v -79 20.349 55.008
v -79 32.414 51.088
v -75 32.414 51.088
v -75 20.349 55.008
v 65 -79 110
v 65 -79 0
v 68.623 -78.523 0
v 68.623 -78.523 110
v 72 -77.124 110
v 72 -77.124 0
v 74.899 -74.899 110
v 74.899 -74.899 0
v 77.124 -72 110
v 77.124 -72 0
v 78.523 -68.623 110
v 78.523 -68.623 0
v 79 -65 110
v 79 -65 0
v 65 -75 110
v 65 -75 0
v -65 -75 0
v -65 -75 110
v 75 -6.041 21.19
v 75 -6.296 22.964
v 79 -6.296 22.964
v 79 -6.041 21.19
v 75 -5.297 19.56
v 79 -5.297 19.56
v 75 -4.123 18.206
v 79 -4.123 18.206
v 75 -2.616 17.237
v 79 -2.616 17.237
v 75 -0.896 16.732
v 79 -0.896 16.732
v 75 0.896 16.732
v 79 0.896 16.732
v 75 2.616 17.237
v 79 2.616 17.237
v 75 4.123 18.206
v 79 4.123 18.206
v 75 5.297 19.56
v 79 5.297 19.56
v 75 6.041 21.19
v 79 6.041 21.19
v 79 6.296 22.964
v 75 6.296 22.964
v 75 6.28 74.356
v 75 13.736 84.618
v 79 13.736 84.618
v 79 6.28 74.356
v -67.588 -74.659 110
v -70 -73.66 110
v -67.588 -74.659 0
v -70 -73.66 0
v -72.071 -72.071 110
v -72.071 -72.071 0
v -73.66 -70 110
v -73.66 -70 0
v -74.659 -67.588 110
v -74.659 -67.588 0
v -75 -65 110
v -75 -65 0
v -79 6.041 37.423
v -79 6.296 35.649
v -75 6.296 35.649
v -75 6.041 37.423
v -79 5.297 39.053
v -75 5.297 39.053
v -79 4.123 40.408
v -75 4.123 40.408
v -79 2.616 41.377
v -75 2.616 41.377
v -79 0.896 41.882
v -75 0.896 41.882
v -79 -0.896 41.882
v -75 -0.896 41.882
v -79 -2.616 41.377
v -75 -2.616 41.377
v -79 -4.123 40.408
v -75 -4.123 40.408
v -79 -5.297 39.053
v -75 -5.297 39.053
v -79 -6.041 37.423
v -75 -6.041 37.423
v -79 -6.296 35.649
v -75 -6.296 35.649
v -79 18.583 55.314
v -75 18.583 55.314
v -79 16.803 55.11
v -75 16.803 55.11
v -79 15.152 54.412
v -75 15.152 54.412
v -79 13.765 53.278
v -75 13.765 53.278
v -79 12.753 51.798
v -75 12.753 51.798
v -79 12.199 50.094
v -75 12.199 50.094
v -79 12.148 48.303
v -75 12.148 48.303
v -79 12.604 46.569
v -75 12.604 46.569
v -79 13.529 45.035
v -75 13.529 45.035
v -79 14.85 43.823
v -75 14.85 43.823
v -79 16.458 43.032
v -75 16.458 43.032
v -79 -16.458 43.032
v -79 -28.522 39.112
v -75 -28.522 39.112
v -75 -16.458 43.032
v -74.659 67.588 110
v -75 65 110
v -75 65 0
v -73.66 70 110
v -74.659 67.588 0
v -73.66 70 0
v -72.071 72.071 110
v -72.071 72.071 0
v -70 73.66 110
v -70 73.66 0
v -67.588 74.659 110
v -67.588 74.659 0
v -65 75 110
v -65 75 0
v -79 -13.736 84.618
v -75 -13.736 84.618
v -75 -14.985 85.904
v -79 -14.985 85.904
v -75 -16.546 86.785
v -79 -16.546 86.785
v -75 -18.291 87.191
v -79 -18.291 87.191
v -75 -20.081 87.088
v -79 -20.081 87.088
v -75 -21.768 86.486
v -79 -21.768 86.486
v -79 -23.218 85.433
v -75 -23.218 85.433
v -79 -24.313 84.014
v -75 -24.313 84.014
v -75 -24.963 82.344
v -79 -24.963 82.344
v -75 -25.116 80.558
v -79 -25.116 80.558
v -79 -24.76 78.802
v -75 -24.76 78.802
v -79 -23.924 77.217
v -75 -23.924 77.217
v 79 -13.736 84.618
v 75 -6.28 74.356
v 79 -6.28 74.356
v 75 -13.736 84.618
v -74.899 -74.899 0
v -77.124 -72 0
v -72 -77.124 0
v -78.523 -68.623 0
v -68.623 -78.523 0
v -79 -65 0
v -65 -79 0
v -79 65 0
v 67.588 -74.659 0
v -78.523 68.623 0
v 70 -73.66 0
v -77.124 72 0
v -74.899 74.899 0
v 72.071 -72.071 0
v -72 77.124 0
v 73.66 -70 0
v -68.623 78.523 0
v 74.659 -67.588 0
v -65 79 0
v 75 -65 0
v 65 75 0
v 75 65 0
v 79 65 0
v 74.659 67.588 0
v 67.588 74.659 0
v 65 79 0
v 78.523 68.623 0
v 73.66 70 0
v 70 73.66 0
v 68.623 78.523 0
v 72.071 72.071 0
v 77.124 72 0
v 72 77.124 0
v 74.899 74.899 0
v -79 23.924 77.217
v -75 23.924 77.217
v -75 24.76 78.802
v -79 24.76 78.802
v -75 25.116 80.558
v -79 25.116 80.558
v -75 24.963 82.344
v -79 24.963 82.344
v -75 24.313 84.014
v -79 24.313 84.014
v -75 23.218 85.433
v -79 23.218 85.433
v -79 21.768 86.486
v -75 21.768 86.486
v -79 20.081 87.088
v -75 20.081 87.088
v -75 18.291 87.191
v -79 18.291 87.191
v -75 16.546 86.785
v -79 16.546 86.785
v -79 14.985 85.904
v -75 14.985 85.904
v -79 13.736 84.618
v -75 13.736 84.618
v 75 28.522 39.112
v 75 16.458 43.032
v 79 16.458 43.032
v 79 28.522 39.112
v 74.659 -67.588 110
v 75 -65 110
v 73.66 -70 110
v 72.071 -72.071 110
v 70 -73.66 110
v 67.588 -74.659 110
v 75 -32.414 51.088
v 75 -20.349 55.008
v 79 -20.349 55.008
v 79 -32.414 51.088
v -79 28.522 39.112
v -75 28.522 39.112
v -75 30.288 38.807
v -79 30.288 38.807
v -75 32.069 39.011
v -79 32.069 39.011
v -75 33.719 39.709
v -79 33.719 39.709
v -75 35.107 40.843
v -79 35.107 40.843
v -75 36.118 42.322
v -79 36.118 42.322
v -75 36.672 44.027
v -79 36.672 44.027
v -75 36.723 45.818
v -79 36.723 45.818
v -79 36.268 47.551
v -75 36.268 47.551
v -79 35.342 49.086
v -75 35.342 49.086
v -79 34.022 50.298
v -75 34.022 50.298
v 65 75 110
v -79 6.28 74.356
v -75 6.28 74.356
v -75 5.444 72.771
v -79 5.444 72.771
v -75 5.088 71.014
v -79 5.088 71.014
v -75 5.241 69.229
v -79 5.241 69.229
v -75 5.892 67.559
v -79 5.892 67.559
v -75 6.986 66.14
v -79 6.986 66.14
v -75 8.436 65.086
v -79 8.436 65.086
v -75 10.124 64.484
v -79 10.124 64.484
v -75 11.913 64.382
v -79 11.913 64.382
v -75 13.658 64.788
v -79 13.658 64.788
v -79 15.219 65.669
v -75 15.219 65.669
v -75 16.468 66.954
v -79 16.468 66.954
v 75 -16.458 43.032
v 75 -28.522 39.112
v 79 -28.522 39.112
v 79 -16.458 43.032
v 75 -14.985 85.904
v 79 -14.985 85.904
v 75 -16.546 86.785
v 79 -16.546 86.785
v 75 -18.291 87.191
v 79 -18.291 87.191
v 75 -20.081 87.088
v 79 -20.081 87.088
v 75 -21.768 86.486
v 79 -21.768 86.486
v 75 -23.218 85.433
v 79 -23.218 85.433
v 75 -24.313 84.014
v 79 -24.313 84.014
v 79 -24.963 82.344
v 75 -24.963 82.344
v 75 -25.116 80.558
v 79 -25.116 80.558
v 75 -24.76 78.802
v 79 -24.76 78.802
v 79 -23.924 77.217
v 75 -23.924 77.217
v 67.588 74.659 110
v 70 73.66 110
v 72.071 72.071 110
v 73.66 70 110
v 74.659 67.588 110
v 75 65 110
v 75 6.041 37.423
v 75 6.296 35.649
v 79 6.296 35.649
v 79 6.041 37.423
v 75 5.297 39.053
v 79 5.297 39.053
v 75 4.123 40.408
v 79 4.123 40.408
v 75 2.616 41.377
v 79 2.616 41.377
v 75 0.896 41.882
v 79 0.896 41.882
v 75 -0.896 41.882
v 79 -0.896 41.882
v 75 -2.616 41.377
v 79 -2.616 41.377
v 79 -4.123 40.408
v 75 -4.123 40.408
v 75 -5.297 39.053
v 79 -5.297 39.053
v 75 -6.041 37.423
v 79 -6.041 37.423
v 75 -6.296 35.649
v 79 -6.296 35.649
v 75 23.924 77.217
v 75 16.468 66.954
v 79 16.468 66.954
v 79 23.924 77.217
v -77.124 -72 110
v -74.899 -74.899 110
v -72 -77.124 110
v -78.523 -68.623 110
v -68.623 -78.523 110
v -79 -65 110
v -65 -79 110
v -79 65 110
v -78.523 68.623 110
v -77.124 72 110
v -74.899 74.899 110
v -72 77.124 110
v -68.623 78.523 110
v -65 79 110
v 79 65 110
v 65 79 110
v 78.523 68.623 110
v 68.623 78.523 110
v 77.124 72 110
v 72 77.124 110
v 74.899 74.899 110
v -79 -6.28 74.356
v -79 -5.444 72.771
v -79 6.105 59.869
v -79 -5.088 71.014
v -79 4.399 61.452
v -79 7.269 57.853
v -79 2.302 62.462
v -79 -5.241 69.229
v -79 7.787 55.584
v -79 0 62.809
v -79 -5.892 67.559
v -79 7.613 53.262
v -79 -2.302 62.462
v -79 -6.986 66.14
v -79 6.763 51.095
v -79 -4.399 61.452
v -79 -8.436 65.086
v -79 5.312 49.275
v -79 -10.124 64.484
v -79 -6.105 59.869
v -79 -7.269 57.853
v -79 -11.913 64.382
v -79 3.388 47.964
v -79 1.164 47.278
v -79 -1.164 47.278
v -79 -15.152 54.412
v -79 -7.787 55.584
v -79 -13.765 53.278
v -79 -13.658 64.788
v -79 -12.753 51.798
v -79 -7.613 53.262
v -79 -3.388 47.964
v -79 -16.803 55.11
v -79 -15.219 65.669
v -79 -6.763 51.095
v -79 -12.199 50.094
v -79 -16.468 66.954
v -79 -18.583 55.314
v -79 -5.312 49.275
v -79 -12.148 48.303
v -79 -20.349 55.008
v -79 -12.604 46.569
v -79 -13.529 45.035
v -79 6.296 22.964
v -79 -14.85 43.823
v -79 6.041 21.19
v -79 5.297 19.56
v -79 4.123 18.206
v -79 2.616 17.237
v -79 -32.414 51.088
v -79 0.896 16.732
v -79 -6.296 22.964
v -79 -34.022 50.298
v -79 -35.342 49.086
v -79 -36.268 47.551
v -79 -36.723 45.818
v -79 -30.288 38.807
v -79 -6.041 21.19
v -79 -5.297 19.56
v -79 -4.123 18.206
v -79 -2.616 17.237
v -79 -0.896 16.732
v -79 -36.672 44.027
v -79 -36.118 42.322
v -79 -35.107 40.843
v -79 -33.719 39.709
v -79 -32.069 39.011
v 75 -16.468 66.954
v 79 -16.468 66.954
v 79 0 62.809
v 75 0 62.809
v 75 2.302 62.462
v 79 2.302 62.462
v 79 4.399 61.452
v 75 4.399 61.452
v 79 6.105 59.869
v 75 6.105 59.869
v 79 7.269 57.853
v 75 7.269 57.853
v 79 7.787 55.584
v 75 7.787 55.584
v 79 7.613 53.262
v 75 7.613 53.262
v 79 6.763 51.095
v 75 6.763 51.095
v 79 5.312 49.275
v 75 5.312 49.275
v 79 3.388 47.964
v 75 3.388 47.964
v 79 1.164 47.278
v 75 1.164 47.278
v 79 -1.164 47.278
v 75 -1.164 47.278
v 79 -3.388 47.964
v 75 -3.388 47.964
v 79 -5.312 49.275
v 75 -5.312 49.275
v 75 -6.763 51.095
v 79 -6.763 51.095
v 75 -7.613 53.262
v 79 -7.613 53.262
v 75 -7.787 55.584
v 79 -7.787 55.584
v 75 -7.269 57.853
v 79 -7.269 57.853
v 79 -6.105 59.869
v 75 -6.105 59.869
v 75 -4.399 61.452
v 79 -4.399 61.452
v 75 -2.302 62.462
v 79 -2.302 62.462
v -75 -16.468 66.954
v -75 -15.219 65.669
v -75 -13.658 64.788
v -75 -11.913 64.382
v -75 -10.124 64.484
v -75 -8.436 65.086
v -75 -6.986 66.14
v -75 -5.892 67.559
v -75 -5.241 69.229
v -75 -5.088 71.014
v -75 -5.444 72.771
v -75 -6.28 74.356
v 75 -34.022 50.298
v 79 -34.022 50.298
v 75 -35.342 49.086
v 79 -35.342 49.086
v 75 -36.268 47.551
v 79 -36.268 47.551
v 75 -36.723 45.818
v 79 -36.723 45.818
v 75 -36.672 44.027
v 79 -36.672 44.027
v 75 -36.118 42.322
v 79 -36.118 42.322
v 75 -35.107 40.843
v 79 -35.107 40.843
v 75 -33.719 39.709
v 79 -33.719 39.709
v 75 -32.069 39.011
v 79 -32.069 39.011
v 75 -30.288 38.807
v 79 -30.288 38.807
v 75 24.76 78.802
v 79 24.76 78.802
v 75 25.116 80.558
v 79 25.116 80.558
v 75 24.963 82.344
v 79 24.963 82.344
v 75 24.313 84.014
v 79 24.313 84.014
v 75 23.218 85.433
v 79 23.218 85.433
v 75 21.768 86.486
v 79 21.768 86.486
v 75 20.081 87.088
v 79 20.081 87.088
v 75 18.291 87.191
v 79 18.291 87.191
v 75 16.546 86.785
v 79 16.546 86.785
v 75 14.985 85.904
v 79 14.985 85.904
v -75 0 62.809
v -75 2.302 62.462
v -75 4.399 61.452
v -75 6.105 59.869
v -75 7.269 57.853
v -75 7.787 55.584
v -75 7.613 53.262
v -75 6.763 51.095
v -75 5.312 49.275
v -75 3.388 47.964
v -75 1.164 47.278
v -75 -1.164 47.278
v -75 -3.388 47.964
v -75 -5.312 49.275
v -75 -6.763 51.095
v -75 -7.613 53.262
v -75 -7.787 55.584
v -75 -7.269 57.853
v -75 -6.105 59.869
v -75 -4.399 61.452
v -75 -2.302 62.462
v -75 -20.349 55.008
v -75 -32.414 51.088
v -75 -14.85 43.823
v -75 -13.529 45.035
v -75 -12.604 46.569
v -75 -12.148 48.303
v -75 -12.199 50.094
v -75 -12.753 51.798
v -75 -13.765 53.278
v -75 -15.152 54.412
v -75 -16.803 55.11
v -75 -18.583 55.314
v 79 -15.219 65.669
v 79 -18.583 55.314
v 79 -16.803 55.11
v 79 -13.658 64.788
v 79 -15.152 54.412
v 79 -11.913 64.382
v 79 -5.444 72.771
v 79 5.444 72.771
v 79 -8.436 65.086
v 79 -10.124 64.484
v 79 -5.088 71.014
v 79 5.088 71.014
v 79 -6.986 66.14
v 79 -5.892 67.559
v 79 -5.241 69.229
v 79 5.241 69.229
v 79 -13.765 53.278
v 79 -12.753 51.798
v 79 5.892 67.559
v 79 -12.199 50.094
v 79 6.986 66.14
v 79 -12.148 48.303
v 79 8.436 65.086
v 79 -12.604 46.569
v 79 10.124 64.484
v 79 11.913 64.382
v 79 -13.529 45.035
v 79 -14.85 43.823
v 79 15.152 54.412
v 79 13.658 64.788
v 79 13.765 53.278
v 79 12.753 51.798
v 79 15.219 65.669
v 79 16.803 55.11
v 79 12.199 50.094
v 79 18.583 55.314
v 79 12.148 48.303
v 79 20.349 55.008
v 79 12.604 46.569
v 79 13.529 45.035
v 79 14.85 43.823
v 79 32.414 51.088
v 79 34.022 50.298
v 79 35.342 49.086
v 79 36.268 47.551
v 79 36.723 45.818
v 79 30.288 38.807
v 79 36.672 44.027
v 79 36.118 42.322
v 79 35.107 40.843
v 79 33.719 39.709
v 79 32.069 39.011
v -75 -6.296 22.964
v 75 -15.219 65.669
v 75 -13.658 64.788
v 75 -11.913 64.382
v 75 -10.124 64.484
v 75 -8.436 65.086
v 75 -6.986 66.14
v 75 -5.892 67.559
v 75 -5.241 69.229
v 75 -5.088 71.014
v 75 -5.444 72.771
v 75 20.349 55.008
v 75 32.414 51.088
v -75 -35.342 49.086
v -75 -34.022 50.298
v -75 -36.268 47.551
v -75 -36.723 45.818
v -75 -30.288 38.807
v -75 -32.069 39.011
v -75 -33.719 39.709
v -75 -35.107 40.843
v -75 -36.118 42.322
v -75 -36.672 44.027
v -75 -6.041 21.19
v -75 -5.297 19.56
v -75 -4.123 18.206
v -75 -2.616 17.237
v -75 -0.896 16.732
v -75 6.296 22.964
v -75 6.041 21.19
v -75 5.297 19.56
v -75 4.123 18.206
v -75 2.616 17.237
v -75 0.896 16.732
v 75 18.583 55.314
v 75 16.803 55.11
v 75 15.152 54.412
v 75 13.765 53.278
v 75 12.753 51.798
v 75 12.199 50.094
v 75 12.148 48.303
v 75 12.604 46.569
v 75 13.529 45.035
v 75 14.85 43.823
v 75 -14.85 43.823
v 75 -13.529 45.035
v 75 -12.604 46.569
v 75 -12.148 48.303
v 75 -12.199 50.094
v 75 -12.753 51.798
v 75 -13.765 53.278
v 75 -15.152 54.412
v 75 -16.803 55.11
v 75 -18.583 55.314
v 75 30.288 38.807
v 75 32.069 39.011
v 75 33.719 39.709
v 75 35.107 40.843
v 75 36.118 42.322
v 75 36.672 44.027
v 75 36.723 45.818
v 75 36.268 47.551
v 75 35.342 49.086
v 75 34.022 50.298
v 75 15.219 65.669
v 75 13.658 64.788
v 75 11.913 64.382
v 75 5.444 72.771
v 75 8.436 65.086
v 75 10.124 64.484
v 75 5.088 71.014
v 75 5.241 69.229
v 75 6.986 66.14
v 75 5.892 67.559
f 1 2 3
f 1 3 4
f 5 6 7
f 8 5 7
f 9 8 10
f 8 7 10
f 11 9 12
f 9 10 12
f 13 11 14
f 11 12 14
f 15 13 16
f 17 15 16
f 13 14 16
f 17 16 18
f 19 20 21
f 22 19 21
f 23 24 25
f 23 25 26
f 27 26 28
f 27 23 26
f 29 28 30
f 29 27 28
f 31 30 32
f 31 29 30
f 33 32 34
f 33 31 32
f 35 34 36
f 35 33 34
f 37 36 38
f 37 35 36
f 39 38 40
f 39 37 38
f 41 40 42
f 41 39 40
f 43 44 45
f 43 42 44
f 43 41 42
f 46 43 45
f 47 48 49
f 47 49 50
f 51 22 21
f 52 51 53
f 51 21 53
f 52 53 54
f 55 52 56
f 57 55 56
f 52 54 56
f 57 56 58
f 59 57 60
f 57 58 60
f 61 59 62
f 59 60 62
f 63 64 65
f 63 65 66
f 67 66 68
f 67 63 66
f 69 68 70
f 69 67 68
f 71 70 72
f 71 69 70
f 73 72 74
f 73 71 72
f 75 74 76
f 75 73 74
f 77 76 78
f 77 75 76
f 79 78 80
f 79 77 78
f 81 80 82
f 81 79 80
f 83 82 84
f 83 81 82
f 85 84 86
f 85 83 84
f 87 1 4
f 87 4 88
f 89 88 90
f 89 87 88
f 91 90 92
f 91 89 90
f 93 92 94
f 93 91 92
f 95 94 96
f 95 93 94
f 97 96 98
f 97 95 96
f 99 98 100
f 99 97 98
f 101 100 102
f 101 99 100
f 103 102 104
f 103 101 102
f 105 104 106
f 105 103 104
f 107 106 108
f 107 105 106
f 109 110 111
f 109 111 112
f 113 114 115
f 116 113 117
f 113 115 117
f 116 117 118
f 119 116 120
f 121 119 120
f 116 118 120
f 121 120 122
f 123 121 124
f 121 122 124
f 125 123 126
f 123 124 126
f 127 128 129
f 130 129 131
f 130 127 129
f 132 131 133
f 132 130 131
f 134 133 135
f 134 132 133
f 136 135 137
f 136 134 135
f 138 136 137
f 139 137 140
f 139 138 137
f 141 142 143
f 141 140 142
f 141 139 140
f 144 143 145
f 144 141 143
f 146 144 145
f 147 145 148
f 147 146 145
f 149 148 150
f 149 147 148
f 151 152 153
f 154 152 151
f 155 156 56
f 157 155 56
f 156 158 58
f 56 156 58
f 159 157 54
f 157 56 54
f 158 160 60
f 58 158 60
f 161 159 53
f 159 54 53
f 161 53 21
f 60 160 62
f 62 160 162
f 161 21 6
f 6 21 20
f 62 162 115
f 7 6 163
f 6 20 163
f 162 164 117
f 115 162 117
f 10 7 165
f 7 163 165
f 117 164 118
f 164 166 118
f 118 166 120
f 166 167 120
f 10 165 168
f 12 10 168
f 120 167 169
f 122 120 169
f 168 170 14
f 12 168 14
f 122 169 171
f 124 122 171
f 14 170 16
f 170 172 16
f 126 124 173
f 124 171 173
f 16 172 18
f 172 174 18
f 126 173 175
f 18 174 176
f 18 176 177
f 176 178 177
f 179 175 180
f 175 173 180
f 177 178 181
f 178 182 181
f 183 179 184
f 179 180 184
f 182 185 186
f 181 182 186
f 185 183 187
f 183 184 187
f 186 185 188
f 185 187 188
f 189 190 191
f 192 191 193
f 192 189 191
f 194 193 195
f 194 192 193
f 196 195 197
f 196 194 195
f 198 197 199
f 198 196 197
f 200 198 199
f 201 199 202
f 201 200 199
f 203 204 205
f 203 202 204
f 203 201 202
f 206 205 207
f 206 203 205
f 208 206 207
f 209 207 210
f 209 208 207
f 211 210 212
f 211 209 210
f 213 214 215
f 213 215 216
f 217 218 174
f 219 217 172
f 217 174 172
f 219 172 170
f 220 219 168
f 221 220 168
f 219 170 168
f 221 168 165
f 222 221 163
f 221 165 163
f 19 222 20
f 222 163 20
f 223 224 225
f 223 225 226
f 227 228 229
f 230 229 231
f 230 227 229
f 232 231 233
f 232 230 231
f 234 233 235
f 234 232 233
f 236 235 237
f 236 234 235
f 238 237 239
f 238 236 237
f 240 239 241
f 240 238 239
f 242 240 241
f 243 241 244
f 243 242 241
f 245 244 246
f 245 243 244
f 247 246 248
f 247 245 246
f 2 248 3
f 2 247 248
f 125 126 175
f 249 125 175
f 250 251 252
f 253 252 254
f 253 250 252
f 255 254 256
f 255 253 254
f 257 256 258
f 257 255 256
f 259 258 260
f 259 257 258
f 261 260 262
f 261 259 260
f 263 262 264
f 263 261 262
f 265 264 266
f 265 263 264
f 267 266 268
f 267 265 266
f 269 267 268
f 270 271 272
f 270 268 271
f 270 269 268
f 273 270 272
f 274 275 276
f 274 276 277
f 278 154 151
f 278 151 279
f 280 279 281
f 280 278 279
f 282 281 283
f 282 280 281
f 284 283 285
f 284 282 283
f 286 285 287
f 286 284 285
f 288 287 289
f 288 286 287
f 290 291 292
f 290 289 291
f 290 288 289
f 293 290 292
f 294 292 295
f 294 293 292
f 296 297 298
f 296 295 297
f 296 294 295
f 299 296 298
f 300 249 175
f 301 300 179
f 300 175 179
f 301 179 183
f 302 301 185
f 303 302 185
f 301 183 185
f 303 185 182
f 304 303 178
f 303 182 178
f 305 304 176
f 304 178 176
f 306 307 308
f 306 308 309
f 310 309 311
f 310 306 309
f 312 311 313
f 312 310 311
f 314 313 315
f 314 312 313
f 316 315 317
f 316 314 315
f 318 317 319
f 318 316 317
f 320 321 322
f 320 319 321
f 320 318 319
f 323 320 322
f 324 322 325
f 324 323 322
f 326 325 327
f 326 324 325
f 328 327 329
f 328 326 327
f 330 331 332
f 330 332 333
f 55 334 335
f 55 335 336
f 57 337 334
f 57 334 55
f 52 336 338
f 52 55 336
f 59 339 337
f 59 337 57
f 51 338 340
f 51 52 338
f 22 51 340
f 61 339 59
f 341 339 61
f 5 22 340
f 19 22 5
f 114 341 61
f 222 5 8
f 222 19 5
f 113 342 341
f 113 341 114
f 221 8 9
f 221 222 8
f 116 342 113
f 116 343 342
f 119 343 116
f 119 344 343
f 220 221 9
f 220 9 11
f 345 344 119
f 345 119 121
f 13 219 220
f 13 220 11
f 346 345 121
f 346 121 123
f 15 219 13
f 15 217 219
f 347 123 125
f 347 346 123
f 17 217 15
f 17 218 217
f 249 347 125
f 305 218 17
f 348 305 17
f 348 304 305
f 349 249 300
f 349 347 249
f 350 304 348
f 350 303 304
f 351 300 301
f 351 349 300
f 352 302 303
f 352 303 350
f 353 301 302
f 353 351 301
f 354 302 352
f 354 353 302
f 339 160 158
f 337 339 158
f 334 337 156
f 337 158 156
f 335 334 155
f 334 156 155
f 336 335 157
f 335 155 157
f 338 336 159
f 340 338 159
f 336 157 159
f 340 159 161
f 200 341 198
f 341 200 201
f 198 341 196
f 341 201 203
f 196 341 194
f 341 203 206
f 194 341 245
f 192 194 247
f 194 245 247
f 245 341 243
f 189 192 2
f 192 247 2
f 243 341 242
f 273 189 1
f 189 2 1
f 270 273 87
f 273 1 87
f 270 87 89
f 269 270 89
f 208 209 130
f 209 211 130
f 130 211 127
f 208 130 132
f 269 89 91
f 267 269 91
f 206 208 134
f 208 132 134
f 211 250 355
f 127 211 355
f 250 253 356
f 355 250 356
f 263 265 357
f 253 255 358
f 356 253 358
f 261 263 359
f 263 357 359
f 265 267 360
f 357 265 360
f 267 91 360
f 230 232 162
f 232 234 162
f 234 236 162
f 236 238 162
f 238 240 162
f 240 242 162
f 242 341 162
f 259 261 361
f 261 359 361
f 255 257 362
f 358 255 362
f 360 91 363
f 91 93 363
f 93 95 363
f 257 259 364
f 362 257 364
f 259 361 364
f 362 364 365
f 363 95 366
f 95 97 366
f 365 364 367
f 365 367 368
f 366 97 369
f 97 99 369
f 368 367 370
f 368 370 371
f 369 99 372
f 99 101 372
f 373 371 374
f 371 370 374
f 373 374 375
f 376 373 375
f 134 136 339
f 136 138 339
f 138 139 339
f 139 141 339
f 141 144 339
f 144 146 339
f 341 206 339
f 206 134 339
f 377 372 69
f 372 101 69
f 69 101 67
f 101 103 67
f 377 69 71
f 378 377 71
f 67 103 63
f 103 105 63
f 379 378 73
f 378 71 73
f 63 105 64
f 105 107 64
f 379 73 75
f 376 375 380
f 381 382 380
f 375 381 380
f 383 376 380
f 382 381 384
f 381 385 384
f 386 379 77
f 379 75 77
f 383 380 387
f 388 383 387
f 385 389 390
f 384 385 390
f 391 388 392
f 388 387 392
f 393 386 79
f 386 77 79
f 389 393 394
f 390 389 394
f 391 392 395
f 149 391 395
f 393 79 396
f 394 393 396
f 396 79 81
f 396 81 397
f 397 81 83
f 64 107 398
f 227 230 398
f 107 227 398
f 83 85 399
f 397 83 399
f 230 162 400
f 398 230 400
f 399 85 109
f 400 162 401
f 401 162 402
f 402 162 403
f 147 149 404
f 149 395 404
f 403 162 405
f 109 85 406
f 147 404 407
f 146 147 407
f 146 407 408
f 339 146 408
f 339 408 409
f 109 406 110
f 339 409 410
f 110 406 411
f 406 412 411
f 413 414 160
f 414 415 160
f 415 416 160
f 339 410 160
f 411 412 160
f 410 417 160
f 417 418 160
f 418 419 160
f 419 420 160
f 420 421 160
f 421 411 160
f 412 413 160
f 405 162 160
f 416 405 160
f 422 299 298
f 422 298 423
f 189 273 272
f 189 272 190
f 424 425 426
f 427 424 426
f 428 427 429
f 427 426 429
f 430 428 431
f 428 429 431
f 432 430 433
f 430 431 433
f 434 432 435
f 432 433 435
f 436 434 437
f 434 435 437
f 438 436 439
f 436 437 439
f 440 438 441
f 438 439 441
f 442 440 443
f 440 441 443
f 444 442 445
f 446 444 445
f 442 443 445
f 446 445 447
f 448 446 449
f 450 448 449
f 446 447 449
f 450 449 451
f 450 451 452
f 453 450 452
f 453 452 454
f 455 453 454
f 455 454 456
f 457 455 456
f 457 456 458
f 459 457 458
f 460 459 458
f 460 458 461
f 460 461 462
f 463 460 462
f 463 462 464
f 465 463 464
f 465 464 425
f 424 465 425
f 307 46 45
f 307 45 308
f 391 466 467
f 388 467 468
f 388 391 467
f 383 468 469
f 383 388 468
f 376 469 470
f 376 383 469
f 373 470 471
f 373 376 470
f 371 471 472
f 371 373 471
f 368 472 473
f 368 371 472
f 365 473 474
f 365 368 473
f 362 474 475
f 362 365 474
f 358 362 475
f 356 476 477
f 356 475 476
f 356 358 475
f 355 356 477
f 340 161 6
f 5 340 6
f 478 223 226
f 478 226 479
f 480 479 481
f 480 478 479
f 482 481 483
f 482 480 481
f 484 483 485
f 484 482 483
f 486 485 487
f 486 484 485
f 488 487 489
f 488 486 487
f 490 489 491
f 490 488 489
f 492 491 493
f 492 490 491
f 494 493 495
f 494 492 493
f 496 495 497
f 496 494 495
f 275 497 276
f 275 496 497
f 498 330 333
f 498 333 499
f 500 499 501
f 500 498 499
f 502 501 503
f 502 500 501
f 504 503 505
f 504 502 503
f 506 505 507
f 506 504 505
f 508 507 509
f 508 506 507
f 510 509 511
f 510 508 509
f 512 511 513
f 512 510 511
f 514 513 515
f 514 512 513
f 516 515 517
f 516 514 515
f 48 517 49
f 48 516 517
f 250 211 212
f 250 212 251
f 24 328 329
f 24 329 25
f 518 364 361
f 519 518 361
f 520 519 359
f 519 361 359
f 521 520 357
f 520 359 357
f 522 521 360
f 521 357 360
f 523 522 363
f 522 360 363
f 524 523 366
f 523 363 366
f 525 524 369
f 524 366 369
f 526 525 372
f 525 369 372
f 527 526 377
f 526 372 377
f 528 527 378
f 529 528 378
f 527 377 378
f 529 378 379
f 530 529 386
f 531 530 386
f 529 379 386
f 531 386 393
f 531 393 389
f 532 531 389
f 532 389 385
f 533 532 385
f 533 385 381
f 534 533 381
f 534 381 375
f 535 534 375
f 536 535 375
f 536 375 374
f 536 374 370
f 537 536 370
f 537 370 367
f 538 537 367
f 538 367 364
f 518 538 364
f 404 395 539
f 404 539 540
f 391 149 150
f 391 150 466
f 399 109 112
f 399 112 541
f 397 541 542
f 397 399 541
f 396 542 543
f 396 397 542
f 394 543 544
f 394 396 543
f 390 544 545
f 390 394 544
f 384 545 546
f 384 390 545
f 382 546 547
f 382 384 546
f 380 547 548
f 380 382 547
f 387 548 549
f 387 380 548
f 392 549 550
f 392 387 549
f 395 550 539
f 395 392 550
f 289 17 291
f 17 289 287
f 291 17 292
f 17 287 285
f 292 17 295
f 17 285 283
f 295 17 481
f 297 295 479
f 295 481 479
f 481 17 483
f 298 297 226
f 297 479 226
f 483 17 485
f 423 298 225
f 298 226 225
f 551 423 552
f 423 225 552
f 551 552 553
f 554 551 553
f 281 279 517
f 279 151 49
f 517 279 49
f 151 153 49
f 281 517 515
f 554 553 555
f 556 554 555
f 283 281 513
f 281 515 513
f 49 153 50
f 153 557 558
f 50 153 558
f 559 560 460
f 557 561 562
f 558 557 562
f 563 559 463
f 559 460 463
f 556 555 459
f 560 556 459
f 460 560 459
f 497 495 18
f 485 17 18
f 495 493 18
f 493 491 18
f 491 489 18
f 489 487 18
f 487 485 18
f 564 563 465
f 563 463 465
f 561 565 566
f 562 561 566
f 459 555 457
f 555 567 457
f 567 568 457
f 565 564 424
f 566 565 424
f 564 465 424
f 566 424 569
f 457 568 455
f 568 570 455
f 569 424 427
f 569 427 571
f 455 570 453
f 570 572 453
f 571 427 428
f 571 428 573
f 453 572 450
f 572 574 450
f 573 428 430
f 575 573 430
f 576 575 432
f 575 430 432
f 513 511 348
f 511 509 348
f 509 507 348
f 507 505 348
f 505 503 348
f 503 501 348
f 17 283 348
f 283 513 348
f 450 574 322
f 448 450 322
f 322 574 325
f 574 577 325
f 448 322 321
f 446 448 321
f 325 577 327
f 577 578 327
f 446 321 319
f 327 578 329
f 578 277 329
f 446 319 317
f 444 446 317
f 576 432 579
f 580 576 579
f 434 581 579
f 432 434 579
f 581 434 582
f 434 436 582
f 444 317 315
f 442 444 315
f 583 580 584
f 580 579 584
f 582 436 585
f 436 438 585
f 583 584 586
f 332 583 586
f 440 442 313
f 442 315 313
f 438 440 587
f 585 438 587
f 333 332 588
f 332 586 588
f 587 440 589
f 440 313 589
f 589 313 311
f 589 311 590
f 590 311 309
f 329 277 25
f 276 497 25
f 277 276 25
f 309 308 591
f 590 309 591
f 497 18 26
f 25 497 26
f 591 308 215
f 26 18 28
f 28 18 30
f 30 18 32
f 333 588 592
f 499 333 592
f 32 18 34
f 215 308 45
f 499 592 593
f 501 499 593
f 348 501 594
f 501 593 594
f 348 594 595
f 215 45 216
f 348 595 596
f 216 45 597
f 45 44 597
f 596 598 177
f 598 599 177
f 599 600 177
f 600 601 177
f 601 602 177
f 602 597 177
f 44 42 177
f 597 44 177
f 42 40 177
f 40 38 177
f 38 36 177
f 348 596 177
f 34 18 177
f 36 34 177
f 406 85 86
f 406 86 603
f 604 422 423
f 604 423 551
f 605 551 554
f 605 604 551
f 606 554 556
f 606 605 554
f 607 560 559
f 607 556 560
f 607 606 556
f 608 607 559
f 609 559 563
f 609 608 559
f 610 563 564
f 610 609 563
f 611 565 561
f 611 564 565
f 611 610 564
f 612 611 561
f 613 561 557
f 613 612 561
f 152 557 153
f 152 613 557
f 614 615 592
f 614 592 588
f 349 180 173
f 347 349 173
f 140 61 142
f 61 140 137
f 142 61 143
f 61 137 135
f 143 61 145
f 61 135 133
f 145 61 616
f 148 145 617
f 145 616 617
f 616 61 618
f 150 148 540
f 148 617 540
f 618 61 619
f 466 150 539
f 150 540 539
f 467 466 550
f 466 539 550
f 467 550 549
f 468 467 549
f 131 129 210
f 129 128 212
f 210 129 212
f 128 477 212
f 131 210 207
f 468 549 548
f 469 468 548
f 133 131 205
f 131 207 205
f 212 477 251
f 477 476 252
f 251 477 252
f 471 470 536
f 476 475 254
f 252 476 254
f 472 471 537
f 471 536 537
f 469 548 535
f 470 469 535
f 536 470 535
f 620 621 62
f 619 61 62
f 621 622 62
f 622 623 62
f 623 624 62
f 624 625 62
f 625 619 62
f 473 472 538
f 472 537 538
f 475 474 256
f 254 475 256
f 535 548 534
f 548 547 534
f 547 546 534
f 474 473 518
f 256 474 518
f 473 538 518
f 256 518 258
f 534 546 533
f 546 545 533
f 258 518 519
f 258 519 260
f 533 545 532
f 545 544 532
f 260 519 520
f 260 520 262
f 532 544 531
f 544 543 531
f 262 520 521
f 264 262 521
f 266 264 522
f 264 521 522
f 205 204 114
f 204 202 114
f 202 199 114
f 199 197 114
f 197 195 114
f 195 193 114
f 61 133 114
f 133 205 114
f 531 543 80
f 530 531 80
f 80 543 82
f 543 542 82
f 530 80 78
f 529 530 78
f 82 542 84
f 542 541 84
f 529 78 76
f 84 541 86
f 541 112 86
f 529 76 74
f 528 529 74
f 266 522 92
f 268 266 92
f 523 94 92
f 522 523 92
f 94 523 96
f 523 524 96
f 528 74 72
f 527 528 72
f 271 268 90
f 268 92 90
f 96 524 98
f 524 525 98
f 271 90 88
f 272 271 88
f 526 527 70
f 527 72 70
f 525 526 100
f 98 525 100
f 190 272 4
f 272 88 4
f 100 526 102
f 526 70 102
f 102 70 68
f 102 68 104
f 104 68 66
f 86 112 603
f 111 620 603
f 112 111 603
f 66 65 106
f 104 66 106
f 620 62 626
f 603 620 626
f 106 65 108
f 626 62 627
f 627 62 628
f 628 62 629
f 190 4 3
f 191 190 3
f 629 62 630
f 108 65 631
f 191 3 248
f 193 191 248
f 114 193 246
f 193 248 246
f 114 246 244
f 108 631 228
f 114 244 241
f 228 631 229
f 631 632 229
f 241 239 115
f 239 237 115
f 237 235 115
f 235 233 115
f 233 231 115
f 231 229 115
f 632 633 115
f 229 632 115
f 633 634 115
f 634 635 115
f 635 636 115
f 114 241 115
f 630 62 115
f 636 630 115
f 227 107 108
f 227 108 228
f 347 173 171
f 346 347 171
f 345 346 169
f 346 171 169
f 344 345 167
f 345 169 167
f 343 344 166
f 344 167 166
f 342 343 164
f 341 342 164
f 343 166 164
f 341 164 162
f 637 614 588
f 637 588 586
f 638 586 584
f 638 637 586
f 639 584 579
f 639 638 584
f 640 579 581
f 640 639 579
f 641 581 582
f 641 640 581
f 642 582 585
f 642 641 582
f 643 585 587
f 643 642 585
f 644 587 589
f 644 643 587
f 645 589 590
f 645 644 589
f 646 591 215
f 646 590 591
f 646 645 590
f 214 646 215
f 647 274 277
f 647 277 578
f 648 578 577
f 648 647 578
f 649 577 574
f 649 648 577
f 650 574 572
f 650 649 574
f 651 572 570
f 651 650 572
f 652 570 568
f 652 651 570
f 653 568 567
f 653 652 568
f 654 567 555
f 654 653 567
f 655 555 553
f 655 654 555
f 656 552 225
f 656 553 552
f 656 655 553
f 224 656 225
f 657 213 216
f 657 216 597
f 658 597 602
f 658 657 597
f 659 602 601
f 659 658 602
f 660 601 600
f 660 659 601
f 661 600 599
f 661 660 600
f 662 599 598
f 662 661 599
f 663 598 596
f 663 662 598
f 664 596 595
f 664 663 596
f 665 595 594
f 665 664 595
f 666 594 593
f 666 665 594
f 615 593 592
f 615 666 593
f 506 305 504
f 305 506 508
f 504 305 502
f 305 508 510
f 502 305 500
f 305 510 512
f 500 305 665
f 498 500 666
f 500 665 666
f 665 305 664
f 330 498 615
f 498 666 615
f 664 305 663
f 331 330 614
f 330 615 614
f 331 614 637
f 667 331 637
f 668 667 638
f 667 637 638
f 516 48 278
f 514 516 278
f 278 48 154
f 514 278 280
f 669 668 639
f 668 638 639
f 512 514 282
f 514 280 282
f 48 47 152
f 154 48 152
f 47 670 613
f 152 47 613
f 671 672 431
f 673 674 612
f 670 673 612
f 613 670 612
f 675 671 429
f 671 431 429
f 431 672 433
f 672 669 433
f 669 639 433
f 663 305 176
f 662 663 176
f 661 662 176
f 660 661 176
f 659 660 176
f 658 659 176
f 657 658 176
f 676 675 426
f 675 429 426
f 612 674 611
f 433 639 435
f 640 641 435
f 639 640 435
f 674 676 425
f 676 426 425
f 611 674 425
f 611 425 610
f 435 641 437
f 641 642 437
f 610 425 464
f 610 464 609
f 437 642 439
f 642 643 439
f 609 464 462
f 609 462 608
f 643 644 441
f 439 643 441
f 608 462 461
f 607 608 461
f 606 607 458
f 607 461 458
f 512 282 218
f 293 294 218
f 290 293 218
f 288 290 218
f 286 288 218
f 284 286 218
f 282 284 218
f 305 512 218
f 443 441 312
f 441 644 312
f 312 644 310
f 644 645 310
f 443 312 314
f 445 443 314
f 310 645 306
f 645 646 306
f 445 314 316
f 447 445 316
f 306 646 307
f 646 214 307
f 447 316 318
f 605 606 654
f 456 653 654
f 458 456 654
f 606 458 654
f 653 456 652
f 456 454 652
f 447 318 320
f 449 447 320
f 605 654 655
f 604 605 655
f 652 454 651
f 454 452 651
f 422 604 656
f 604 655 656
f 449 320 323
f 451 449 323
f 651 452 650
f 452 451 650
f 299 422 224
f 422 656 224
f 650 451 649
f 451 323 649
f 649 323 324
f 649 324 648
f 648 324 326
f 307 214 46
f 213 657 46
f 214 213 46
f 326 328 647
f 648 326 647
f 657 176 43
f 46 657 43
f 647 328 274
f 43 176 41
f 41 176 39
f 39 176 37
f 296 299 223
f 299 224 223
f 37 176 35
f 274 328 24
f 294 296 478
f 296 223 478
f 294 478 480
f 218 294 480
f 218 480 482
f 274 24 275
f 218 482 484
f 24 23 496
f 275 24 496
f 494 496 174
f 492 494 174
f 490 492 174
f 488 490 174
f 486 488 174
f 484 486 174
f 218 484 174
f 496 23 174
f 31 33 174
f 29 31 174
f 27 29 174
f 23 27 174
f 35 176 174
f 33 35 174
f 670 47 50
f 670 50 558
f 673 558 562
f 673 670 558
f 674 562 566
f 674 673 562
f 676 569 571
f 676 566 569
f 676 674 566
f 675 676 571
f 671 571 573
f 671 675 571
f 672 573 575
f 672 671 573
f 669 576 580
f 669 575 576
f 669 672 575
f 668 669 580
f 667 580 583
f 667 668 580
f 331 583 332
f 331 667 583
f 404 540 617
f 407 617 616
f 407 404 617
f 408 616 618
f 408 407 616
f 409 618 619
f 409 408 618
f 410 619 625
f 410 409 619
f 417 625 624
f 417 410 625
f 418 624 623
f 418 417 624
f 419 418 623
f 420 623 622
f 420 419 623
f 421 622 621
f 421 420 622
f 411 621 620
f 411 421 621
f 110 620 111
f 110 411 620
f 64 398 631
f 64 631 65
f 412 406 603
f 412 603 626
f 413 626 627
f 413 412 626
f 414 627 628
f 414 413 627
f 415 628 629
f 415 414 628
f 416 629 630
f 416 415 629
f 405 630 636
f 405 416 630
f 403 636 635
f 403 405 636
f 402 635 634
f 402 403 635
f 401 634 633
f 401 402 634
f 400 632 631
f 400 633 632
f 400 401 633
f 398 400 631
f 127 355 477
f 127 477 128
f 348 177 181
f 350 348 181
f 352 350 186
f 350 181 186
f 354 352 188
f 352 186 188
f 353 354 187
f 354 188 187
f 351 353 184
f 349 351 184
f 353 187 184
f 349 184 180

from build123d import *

# Parameters (mm, degrees)
BOSS_EXTRU_1_DEPTH      = 110
ESQUISSE2_R             = 7.809149938
ENL_V_MAT_EXTRU_1_DEPTH = 159


with BuildPart() as part:
    # Esquisse1 → Boss.-Extru.1 (new body)
    with BuildSketch(Plane.XY):
        with BuildLine():
            Line((-79, 65), (-79, -65))
            ThreePointArc((-79, -65), (-74.899494937, -74.899494937), (-65, -79))
            Line((-65, -79), (65, -79))
            ThreePointArc((65, -79), (74.899494937, -74.899494937), (79, -65))
            Line((79, -65), (79, 65))
            ThreePointArc((79, 65), (74.899494937, 74.899494937), (65, 79))
            Line((65, 79), (-65, 79))
            ThreePointArc((-65, 79), (-74.899494937, 74.899494937), (-79, 65))
        make_face()
        with BuildLine():
            Line((-65, 75), (65, 75))
            ThreePointArc((65, 75), (72.071067812, 72.071067812), (75, 65))
            Line((75, 65), (75, -65))
            ThreePointArc((75, -65), (72.071067812, -72.071067812), (65, -75))
            Line((65, -75), (-65, -75))
            ThreePointArc((-65, -75), (-72.071067812, -72.071067812), (-75, -65))
            Line((-75, -65), (-75, 65))
            ThreePointArc((-75, 65), (-72.071067812, 72.071067812), (-65, 75))
        make_face(mode=Mode.SUBTRACT)
    extrude(amount=BOSS_EXTRU_1_DEPTH)

    # Esquisse2 → Enlèv. mat.-Extru.1 (cut, through all)
    with BuildSketch(Plane.ZY.offset(79)):
        with Locations((55, 0)):
            Circle(ESQUISSE2_R)
        with BuildLine():
            Line((22.964069625, 6.296228474), (35.649419661, 6.296228474))
            ThreePointArc((35.649419661, 6.296228474), (41.945648134, 0), (35.649419661, -6.296228474))
            Line((35.649419661, -6.296228474), (22.964069625, -6.296228474))
            ThreePointArc((22.964069625, -6.296228474), (16.667841152, 0), (22.964069625, 6.296228474))
        make_face()
        with BuildLine():
            Line((51.088422202, 32.413621937), (55.008410942, 20.349137125))
            ThreePointArc((55.008410942, 20.349137125), (50.965983423, 12.415426408), (43.032272706, 16.457853927))
            Line((43.032272706, 16.457853927), (39.112283966, 28.52233874))
            ThreePointArc((39.112283966, 28.52233874), (43.154711485, 36.456049456), (51.088422202, 32.413621937))
        make_face()
        with BuildLine():
            Line((84.618442346, 13.736491582), (74.355778588, 6.280229911))
            ThreePointArc((74.355778588, 6.280229911), (65.56119251, 7.673155505), (66.954118104, 16.467741582))
            Line((66.954118104, 16.467741582), (77.216781862, 23.924003253))
            ThreePointArc((77.216781862, 23.924003253), (86.011367939, 22.53107766), (84.618442346, 13.736491582))
        make_face()
        with BuildLine():
            Line((77.216781862, -23.924003253), (66.954118104, -16.467741582))
            ThreePointArc((66.954118104, -16.467741582), (65.56119251, -7.673155505), (74.355778588, -6.280229911))
            Line((74.355778588, -6.280229911), (84.618442346, -13.736491582))
            ThreePointArc((84.618442346, -13.736491582), (86.011367939, -22.53107766), (77.216781862, -23.924003253))
        make_face()
        with BuildLine():
            Line((39.112283966, -28.52233874), (43.032272706, -16.457853927))
            ThreePointArc((43.032272706, -16.457853927), (50.965983423, -12.415426408), (55.008410942, -20.349137125))
            Line((55.008410942, -20.349137125), (51.088422202, -32.413621937))
            ThreePointArc((51.088422202, -32.413621937), (43.154711485, -36.456049456), (39.112283966, -28.52233874))
        make_face()
    extrude(amount=-ENL_V_MAT_EXTRU_1_DEPTH, mode=Mode.SUBTRACT)


solid = part.part
